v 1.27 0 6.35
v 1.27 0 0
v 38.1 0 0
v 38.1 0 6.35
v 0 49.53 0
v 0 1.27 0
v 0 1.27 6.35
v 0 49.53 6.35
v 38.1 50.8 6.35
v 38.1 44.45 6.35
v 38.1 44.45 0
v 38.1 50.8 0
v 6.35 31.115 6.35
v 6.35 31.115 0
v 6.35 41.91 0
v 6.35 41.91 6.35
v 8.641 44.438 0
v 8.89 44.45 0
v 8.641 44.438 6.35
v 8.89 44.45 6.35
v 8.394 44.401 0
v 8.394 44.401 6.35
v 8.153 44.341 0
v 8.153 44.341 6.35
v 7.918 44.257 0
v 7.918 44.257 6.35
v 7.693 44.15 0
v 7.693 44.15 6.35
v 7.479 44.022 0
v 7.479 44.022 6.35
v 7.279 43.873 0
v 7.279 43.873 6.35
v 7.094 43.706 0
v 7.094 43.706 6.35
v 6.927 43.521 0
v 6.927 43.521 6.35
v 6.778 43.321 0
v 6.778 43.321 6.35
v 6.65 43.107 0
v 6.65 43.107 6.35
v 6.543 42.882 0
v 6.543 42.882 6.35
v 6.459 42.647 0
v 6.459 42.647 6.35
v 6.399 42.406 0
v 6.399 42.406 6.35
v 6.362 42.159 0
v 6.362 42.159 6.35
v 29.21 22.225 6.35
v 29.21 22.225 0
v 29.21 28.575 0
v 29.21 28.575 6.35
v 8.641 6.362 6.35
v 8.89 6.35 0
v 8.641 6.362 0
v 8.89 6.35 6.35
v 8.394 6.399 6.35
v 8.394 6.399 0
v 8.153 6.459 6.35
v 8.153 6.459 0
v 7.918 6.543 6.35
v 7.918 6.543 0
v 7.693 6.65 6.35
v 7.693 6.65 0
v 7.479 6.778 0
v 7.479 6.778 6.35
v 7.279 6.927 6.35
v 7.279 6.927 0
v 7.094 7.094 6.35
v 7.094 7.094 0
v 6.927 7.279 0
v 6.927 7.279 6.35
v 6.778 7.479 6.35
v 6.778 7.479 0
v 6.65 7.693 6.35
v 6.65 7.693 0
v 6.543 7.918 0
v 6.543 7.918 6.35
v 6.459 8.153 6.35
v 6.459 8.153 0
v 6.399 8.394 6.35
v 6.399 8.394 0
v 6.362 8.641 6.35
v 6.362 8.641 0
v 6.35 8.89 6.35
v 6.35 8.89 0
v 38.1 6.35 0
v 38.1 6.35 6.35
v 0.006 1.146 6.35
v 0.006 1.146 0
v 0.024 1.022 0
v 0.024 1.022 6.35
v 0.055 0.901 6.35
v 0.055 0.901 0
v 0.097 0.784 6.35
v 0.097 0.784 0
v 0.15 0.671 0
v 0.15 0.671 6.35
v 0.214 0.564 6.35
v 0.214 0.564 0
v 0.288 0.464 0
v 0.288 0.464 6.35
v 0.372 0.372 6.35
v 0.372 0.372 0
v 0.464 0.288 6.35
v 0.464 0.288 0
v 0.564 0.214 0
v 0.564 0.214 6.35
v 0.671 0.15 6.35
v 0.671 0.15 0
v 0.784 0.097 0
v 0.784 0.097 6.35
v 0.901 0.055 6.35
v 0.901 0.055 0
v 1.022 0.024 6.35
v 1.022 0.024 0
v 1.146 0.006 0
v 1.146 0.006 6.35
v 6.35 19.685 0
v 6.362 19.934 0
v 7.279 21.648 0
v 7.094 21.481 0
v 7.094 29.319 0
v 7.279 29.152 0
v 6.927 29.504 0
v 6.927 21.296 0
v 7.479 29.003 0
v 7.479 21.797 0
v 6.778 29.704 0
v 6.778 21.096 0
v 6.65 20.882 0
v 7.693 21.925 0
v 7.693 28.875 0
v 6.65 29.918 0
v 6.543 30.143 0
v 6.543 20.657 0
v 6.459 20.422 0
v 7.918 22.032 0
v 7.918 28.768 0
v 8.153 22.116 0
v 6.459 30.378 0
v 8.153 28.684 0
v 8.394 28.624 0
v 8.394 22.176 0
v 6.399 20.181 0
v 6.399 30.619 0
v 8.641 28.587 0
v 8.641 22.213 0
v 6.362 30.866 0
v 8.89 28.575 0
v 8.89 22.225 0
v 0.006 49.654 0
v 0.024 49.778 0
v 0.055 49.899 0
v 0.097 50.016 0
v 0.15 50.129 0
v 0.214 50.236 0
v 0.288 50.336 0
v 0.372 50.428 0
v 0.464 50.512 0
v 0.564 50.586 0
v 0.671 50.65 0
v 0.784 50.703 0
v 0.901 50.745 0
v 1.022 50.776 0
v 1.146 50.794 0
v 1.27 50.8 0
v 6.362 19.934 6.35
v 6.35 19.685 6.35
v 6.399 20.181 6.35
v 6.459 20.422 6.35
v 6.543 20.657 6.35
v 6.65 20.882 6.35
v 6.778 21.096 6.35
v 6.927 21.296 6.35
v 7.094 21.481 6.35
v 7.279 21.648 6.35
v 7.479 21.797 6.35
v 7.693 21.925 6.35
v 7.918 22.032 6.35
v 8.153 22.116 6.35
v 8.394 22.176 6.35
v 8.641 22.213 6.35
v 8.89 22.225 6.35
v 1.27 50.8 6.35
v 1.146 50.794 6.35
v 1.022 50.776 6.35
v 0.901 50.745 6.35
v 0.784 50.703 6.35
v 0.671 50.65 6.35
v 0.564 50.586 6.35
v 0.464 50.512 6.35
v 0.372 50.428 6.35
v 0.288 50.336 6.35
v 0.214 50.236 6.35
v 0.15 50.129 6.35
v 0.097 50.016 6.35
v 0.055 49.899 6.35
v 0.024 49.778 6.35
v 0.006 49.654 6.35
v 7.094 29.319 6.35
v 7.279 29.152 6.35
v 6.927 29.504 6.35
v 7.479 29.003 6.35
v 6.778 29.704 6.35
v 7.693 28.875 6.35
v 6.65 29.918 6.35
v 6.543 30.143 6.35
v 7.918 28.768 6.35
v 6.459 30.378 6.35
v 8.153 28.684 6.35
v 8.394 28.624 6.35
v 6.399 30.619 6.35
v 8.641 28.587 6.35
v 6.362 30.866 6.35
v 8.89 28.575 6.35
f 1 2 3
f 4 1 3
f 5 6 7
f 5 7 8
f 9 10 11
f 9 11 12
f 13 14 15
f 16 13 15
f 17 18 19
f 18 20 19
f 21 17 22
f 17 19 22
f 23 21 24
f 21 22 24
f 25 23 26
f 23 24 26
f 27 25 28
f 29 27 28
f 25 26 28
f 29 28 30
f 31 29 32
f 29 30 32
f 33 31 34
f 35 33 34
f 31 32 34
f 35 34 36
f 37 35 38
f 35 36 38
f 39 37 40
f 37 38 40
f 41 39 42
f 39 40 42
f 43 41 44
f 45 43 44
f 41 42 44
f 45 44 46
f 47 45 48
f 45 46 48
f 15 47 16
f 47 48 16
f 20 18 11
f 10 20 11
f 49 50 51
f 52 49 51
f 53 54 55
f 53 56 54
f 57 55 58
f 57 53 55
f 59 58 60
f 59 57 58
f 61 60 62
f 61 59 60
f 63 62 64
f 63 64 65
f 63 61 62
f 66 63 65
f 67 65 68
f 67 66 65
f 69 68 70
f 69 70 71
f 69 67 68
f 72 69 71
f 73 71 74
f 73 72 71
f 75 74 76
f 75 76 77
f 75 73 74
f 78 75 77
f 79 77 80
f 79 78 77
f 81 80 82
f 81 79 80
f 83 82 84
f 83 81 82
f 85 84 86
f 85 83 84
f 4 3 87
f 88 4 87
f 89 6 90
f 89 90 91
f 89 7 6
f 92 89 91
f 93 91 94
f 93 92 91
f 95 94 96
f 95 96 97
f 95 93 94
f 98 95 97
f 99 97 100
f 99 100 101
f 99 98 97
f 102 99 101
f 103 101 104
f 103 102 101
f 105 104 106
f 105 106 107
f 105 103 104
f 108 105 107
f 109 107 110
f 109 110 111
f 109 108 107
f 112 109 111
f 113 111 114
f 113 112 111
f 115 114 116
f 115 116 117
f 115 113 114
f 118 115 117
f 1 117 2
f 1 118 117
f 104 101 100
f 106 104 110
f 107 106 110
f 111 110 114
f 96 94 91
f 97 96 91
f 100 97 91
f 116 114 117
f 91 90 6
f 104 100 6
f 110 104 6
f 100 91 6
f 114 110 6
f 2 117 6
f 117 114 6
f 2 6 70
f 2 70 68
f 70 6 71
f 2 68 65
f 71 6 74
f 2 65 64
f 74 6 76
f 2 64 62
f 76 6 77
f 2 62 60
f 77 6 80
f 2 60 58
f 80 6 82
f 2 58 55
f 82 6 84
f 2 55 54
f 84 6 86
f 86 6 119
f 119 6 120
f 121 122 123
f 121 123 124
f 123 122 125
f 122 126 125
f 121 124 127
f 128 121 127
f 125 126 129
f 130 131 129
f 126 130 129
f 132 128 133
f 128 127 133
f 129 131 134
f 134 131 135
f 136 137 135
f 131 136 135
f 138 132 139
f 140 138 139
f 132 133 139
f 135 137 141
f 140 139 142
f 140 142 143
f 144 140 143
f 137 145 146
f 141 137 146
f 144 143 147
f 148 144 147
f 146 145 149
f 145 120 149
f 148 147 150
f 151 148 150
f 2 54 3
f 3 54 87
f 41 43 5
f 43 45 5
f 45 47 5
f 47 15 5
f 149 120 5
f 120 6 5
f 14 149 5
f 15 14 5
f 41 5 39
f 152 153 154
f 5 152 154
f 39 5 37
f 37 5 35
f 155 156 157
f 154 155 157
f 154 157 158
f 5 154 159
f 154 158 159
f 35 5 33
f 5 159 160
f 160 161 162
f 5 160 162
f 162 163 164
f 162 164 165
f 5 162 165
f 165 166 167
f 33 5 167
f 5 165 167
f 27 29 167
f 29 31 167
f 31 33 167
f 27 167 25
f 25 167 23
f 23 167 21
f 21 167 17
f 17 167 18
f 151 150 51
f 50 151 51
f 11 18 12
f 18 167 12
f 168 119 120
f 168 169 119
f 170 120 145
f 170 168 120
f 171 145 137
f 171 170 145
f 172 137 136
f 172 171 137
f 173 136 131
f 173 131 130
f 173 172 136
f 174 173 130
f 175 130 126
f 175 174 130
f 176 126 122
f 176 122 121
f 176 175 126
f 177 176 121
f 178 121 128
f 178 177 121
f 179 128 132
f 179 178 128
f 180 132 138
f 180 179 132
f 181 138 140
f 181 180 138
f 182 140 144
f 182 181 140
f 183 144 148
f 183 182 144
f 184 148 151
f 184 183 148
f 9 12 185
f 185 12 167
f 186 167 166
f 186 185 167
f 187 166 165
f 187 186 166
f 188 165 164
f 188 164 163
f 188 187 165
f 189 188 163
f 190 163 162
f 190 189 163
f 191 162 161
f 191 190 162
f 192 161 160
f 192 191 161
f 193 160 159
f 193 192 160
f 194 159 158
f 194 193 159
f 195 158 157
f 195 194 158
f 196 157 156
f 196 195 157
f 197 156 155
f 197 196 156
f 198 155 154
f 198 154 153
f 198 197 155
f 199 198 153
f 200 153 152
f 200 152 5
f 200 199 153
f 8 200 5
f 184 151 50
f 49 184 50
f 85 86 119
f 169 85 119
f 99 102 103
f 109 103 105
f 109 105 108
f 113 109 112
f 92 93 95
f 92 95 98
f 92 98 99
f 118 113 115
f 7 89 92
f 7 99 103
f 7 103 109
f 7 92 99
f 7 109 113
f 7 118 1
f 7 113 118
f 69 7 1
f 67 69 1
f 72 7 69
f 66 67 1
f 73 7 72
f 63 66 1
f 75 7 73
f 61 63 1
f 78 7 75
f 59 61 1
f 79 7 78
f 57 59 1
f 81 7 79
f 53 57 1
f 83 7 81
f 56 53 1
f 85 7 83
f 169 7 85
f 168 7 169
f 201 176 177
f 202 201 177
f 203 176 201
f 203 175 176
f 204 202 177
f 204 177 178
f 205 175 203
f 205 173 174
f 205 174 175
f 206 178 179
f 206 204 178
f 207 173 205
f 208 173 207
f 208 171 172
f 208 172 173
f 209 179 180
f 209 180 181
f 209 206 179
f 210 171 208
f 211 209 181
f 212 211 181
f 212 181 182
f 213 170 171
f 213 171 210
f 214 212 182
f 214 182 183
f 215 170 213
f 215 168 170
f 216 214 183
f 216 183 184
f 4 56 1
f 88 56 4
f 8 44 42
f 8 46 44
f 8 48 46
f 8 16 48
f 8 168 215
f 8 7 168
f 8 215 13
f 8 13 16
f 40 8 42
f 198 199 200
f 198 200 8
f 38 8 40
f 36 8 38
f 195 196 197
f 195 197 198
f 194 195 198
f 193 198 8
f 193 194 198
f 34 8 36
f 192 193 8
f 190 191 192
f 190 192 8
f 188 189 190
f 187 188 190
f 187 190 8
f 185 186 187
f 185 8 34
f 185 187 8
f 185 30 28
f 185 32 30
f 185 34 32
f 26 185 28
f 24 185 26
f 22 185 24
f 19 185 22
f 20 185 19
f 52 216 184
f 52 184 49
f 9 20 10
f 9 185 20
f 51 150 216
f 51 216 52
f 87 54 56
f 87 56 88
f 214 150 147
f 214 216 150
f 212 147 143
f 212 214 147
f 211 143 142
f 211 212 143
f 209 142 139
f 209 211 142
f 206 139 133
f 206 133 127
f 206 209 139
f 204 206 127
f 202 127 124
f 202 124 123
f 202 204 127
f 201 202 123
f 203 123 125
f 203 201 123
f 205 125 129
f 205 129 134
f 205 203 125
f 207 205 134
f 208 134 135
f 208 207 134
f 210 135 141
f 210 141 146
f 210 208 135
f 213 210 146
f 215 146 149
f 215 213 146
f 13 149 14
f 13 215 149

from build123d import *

# Parameters (mm, degrees)
SKETCH1_W           = 31.75
SKETCH1_H           = 6.35
SKETCH1_W_2         = 6.35
SKETCH1_H_2         = 50.8
SKETCH1_W_3         = 22.86
BOSS_EXTRUDE1_DEPTH = 6.35
FILLET1_R           = 2.54
FILLET2_R           = 1.27


with BuildPart() as part:
    # Sketch1 → Boss-Extrude1 (new body)
    with BuildSketch(Plane.XY):
        with Locations((22.225, 47.625)):
            Rectangle(SKETCH1_W, SKETCH1_H)
        with Locations((3.175, 25.4)):
            Rectangle(SKETCH1_W_2, SKETCH1_H_2)
        with Locations((17.78, 25.4)):
            Rectangle(SKETCH1_W_3, SKETCH1_H)
        with Locations((22.225, 3.175)):
            Rectangle(SKETCH1_W, SKETCH1_H)
    extrude(amount=BOSS_EXTRUDE1_DEPTH)

    # Fillet1
    fillet1_edges = [part.edges().sort_by_distance(p)[0] for p in [
        (6.35, 44.45, 3.175),
        (6.35, 28.575, 3.175),
        (6.35, 22.225, 3.175),
        (6.35, 6.35, 3.175),
    ]]
    fillet(fillet1_edges, radius=FILLET1_R)

    # Fillet2
    fillet2_edges = [part.edges().sort_by_distance(p)[0] for p in [
        (0, 0, 3.175),
        (0, 50.8, 3.175),
    ]]
    fillet(fillet2_edges, radius=FILLET2_R)


solid = part.part
